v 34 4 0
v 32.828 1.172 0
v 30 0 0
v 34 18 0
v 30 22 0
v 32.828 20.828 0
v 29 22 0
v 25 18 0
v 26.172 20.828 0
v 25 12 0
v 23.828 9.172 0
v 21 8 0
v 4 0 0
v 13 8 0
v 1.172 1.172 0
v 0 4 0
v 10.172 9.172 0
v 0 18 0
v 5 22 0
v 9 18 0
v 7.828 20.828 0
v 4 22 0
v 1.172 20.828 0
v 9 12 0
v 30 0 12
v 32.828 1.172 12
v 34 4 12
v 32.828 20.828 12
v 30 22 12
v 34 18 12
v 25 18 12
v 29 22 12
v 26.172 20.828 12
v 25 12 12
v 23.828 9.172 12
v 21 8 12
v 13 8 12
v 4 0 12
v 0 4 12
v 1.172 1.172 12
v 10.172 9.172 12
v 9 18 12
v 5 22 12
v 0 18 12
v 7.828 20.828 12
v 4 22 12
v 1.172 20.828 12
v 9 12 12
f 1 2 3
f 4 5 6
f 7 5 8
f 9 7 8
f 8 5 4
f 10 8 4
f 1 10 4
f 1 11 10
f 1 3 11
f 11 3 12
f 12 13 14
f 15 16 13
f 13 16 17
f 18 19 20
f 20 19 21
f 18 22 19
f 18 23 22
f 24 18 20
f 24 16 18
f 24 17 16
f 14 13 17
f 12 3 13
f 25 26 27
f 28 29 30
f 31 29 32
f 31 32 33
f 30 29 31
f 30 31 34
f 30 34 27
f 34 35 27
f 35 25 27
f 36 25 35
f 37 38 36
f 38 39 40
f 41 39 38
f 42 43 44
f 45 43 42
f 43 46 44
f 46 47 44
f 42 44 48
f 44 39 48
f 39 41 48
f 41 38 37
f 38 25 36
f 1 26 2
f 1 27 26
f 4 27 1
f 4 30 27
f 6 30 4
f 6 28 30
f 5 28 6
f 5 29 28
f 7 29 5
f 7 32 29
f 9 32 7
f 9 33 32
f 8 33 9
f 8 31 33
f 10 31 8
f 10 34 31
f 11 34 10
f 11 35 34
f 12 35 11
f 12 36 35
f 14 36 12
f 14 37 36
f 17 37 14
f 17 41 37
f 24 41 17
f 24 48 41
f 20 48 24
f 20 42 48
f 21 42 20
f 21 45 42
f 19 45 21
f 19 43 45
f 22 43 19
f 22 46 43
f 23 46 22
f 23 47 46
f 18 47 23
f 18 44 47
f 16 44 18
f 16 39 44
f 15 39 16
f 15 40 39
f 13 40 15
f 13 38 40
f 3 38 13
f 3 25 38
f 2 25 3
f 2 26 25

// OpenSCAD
$fn = 32;

// ----------------------------------------------------------------------
// Eye lug: clevis, 12 mm thick
// ----------------------------------------------------------------------

// --- parameters (mm) ---
profile_height = 12;      // extrusion height
profile_points = 24;      // points of the closed outline

profile = [[0, 4], [1.172, 1.172], [4, 0], [30, 0], [32.828, 1.172], [34, 4], [34, 18], [32.828, 20.828], [30, 22], [29, 22], [26.172, 20.828], [25, 18], [25, 12], [23.828, 9.172], [21, 8], [13, 8], [10.172, 9.172], [9, 12], [9, 18], [7.828, 20.828], [5, 22], [4, 22], [1.172, 20.828], [0, 18]];  // single closed polygon, 24 points, counter clockwise

// --- the one profile operation ---
linear_extrude(height = profile_height) polygon(points = profile);
